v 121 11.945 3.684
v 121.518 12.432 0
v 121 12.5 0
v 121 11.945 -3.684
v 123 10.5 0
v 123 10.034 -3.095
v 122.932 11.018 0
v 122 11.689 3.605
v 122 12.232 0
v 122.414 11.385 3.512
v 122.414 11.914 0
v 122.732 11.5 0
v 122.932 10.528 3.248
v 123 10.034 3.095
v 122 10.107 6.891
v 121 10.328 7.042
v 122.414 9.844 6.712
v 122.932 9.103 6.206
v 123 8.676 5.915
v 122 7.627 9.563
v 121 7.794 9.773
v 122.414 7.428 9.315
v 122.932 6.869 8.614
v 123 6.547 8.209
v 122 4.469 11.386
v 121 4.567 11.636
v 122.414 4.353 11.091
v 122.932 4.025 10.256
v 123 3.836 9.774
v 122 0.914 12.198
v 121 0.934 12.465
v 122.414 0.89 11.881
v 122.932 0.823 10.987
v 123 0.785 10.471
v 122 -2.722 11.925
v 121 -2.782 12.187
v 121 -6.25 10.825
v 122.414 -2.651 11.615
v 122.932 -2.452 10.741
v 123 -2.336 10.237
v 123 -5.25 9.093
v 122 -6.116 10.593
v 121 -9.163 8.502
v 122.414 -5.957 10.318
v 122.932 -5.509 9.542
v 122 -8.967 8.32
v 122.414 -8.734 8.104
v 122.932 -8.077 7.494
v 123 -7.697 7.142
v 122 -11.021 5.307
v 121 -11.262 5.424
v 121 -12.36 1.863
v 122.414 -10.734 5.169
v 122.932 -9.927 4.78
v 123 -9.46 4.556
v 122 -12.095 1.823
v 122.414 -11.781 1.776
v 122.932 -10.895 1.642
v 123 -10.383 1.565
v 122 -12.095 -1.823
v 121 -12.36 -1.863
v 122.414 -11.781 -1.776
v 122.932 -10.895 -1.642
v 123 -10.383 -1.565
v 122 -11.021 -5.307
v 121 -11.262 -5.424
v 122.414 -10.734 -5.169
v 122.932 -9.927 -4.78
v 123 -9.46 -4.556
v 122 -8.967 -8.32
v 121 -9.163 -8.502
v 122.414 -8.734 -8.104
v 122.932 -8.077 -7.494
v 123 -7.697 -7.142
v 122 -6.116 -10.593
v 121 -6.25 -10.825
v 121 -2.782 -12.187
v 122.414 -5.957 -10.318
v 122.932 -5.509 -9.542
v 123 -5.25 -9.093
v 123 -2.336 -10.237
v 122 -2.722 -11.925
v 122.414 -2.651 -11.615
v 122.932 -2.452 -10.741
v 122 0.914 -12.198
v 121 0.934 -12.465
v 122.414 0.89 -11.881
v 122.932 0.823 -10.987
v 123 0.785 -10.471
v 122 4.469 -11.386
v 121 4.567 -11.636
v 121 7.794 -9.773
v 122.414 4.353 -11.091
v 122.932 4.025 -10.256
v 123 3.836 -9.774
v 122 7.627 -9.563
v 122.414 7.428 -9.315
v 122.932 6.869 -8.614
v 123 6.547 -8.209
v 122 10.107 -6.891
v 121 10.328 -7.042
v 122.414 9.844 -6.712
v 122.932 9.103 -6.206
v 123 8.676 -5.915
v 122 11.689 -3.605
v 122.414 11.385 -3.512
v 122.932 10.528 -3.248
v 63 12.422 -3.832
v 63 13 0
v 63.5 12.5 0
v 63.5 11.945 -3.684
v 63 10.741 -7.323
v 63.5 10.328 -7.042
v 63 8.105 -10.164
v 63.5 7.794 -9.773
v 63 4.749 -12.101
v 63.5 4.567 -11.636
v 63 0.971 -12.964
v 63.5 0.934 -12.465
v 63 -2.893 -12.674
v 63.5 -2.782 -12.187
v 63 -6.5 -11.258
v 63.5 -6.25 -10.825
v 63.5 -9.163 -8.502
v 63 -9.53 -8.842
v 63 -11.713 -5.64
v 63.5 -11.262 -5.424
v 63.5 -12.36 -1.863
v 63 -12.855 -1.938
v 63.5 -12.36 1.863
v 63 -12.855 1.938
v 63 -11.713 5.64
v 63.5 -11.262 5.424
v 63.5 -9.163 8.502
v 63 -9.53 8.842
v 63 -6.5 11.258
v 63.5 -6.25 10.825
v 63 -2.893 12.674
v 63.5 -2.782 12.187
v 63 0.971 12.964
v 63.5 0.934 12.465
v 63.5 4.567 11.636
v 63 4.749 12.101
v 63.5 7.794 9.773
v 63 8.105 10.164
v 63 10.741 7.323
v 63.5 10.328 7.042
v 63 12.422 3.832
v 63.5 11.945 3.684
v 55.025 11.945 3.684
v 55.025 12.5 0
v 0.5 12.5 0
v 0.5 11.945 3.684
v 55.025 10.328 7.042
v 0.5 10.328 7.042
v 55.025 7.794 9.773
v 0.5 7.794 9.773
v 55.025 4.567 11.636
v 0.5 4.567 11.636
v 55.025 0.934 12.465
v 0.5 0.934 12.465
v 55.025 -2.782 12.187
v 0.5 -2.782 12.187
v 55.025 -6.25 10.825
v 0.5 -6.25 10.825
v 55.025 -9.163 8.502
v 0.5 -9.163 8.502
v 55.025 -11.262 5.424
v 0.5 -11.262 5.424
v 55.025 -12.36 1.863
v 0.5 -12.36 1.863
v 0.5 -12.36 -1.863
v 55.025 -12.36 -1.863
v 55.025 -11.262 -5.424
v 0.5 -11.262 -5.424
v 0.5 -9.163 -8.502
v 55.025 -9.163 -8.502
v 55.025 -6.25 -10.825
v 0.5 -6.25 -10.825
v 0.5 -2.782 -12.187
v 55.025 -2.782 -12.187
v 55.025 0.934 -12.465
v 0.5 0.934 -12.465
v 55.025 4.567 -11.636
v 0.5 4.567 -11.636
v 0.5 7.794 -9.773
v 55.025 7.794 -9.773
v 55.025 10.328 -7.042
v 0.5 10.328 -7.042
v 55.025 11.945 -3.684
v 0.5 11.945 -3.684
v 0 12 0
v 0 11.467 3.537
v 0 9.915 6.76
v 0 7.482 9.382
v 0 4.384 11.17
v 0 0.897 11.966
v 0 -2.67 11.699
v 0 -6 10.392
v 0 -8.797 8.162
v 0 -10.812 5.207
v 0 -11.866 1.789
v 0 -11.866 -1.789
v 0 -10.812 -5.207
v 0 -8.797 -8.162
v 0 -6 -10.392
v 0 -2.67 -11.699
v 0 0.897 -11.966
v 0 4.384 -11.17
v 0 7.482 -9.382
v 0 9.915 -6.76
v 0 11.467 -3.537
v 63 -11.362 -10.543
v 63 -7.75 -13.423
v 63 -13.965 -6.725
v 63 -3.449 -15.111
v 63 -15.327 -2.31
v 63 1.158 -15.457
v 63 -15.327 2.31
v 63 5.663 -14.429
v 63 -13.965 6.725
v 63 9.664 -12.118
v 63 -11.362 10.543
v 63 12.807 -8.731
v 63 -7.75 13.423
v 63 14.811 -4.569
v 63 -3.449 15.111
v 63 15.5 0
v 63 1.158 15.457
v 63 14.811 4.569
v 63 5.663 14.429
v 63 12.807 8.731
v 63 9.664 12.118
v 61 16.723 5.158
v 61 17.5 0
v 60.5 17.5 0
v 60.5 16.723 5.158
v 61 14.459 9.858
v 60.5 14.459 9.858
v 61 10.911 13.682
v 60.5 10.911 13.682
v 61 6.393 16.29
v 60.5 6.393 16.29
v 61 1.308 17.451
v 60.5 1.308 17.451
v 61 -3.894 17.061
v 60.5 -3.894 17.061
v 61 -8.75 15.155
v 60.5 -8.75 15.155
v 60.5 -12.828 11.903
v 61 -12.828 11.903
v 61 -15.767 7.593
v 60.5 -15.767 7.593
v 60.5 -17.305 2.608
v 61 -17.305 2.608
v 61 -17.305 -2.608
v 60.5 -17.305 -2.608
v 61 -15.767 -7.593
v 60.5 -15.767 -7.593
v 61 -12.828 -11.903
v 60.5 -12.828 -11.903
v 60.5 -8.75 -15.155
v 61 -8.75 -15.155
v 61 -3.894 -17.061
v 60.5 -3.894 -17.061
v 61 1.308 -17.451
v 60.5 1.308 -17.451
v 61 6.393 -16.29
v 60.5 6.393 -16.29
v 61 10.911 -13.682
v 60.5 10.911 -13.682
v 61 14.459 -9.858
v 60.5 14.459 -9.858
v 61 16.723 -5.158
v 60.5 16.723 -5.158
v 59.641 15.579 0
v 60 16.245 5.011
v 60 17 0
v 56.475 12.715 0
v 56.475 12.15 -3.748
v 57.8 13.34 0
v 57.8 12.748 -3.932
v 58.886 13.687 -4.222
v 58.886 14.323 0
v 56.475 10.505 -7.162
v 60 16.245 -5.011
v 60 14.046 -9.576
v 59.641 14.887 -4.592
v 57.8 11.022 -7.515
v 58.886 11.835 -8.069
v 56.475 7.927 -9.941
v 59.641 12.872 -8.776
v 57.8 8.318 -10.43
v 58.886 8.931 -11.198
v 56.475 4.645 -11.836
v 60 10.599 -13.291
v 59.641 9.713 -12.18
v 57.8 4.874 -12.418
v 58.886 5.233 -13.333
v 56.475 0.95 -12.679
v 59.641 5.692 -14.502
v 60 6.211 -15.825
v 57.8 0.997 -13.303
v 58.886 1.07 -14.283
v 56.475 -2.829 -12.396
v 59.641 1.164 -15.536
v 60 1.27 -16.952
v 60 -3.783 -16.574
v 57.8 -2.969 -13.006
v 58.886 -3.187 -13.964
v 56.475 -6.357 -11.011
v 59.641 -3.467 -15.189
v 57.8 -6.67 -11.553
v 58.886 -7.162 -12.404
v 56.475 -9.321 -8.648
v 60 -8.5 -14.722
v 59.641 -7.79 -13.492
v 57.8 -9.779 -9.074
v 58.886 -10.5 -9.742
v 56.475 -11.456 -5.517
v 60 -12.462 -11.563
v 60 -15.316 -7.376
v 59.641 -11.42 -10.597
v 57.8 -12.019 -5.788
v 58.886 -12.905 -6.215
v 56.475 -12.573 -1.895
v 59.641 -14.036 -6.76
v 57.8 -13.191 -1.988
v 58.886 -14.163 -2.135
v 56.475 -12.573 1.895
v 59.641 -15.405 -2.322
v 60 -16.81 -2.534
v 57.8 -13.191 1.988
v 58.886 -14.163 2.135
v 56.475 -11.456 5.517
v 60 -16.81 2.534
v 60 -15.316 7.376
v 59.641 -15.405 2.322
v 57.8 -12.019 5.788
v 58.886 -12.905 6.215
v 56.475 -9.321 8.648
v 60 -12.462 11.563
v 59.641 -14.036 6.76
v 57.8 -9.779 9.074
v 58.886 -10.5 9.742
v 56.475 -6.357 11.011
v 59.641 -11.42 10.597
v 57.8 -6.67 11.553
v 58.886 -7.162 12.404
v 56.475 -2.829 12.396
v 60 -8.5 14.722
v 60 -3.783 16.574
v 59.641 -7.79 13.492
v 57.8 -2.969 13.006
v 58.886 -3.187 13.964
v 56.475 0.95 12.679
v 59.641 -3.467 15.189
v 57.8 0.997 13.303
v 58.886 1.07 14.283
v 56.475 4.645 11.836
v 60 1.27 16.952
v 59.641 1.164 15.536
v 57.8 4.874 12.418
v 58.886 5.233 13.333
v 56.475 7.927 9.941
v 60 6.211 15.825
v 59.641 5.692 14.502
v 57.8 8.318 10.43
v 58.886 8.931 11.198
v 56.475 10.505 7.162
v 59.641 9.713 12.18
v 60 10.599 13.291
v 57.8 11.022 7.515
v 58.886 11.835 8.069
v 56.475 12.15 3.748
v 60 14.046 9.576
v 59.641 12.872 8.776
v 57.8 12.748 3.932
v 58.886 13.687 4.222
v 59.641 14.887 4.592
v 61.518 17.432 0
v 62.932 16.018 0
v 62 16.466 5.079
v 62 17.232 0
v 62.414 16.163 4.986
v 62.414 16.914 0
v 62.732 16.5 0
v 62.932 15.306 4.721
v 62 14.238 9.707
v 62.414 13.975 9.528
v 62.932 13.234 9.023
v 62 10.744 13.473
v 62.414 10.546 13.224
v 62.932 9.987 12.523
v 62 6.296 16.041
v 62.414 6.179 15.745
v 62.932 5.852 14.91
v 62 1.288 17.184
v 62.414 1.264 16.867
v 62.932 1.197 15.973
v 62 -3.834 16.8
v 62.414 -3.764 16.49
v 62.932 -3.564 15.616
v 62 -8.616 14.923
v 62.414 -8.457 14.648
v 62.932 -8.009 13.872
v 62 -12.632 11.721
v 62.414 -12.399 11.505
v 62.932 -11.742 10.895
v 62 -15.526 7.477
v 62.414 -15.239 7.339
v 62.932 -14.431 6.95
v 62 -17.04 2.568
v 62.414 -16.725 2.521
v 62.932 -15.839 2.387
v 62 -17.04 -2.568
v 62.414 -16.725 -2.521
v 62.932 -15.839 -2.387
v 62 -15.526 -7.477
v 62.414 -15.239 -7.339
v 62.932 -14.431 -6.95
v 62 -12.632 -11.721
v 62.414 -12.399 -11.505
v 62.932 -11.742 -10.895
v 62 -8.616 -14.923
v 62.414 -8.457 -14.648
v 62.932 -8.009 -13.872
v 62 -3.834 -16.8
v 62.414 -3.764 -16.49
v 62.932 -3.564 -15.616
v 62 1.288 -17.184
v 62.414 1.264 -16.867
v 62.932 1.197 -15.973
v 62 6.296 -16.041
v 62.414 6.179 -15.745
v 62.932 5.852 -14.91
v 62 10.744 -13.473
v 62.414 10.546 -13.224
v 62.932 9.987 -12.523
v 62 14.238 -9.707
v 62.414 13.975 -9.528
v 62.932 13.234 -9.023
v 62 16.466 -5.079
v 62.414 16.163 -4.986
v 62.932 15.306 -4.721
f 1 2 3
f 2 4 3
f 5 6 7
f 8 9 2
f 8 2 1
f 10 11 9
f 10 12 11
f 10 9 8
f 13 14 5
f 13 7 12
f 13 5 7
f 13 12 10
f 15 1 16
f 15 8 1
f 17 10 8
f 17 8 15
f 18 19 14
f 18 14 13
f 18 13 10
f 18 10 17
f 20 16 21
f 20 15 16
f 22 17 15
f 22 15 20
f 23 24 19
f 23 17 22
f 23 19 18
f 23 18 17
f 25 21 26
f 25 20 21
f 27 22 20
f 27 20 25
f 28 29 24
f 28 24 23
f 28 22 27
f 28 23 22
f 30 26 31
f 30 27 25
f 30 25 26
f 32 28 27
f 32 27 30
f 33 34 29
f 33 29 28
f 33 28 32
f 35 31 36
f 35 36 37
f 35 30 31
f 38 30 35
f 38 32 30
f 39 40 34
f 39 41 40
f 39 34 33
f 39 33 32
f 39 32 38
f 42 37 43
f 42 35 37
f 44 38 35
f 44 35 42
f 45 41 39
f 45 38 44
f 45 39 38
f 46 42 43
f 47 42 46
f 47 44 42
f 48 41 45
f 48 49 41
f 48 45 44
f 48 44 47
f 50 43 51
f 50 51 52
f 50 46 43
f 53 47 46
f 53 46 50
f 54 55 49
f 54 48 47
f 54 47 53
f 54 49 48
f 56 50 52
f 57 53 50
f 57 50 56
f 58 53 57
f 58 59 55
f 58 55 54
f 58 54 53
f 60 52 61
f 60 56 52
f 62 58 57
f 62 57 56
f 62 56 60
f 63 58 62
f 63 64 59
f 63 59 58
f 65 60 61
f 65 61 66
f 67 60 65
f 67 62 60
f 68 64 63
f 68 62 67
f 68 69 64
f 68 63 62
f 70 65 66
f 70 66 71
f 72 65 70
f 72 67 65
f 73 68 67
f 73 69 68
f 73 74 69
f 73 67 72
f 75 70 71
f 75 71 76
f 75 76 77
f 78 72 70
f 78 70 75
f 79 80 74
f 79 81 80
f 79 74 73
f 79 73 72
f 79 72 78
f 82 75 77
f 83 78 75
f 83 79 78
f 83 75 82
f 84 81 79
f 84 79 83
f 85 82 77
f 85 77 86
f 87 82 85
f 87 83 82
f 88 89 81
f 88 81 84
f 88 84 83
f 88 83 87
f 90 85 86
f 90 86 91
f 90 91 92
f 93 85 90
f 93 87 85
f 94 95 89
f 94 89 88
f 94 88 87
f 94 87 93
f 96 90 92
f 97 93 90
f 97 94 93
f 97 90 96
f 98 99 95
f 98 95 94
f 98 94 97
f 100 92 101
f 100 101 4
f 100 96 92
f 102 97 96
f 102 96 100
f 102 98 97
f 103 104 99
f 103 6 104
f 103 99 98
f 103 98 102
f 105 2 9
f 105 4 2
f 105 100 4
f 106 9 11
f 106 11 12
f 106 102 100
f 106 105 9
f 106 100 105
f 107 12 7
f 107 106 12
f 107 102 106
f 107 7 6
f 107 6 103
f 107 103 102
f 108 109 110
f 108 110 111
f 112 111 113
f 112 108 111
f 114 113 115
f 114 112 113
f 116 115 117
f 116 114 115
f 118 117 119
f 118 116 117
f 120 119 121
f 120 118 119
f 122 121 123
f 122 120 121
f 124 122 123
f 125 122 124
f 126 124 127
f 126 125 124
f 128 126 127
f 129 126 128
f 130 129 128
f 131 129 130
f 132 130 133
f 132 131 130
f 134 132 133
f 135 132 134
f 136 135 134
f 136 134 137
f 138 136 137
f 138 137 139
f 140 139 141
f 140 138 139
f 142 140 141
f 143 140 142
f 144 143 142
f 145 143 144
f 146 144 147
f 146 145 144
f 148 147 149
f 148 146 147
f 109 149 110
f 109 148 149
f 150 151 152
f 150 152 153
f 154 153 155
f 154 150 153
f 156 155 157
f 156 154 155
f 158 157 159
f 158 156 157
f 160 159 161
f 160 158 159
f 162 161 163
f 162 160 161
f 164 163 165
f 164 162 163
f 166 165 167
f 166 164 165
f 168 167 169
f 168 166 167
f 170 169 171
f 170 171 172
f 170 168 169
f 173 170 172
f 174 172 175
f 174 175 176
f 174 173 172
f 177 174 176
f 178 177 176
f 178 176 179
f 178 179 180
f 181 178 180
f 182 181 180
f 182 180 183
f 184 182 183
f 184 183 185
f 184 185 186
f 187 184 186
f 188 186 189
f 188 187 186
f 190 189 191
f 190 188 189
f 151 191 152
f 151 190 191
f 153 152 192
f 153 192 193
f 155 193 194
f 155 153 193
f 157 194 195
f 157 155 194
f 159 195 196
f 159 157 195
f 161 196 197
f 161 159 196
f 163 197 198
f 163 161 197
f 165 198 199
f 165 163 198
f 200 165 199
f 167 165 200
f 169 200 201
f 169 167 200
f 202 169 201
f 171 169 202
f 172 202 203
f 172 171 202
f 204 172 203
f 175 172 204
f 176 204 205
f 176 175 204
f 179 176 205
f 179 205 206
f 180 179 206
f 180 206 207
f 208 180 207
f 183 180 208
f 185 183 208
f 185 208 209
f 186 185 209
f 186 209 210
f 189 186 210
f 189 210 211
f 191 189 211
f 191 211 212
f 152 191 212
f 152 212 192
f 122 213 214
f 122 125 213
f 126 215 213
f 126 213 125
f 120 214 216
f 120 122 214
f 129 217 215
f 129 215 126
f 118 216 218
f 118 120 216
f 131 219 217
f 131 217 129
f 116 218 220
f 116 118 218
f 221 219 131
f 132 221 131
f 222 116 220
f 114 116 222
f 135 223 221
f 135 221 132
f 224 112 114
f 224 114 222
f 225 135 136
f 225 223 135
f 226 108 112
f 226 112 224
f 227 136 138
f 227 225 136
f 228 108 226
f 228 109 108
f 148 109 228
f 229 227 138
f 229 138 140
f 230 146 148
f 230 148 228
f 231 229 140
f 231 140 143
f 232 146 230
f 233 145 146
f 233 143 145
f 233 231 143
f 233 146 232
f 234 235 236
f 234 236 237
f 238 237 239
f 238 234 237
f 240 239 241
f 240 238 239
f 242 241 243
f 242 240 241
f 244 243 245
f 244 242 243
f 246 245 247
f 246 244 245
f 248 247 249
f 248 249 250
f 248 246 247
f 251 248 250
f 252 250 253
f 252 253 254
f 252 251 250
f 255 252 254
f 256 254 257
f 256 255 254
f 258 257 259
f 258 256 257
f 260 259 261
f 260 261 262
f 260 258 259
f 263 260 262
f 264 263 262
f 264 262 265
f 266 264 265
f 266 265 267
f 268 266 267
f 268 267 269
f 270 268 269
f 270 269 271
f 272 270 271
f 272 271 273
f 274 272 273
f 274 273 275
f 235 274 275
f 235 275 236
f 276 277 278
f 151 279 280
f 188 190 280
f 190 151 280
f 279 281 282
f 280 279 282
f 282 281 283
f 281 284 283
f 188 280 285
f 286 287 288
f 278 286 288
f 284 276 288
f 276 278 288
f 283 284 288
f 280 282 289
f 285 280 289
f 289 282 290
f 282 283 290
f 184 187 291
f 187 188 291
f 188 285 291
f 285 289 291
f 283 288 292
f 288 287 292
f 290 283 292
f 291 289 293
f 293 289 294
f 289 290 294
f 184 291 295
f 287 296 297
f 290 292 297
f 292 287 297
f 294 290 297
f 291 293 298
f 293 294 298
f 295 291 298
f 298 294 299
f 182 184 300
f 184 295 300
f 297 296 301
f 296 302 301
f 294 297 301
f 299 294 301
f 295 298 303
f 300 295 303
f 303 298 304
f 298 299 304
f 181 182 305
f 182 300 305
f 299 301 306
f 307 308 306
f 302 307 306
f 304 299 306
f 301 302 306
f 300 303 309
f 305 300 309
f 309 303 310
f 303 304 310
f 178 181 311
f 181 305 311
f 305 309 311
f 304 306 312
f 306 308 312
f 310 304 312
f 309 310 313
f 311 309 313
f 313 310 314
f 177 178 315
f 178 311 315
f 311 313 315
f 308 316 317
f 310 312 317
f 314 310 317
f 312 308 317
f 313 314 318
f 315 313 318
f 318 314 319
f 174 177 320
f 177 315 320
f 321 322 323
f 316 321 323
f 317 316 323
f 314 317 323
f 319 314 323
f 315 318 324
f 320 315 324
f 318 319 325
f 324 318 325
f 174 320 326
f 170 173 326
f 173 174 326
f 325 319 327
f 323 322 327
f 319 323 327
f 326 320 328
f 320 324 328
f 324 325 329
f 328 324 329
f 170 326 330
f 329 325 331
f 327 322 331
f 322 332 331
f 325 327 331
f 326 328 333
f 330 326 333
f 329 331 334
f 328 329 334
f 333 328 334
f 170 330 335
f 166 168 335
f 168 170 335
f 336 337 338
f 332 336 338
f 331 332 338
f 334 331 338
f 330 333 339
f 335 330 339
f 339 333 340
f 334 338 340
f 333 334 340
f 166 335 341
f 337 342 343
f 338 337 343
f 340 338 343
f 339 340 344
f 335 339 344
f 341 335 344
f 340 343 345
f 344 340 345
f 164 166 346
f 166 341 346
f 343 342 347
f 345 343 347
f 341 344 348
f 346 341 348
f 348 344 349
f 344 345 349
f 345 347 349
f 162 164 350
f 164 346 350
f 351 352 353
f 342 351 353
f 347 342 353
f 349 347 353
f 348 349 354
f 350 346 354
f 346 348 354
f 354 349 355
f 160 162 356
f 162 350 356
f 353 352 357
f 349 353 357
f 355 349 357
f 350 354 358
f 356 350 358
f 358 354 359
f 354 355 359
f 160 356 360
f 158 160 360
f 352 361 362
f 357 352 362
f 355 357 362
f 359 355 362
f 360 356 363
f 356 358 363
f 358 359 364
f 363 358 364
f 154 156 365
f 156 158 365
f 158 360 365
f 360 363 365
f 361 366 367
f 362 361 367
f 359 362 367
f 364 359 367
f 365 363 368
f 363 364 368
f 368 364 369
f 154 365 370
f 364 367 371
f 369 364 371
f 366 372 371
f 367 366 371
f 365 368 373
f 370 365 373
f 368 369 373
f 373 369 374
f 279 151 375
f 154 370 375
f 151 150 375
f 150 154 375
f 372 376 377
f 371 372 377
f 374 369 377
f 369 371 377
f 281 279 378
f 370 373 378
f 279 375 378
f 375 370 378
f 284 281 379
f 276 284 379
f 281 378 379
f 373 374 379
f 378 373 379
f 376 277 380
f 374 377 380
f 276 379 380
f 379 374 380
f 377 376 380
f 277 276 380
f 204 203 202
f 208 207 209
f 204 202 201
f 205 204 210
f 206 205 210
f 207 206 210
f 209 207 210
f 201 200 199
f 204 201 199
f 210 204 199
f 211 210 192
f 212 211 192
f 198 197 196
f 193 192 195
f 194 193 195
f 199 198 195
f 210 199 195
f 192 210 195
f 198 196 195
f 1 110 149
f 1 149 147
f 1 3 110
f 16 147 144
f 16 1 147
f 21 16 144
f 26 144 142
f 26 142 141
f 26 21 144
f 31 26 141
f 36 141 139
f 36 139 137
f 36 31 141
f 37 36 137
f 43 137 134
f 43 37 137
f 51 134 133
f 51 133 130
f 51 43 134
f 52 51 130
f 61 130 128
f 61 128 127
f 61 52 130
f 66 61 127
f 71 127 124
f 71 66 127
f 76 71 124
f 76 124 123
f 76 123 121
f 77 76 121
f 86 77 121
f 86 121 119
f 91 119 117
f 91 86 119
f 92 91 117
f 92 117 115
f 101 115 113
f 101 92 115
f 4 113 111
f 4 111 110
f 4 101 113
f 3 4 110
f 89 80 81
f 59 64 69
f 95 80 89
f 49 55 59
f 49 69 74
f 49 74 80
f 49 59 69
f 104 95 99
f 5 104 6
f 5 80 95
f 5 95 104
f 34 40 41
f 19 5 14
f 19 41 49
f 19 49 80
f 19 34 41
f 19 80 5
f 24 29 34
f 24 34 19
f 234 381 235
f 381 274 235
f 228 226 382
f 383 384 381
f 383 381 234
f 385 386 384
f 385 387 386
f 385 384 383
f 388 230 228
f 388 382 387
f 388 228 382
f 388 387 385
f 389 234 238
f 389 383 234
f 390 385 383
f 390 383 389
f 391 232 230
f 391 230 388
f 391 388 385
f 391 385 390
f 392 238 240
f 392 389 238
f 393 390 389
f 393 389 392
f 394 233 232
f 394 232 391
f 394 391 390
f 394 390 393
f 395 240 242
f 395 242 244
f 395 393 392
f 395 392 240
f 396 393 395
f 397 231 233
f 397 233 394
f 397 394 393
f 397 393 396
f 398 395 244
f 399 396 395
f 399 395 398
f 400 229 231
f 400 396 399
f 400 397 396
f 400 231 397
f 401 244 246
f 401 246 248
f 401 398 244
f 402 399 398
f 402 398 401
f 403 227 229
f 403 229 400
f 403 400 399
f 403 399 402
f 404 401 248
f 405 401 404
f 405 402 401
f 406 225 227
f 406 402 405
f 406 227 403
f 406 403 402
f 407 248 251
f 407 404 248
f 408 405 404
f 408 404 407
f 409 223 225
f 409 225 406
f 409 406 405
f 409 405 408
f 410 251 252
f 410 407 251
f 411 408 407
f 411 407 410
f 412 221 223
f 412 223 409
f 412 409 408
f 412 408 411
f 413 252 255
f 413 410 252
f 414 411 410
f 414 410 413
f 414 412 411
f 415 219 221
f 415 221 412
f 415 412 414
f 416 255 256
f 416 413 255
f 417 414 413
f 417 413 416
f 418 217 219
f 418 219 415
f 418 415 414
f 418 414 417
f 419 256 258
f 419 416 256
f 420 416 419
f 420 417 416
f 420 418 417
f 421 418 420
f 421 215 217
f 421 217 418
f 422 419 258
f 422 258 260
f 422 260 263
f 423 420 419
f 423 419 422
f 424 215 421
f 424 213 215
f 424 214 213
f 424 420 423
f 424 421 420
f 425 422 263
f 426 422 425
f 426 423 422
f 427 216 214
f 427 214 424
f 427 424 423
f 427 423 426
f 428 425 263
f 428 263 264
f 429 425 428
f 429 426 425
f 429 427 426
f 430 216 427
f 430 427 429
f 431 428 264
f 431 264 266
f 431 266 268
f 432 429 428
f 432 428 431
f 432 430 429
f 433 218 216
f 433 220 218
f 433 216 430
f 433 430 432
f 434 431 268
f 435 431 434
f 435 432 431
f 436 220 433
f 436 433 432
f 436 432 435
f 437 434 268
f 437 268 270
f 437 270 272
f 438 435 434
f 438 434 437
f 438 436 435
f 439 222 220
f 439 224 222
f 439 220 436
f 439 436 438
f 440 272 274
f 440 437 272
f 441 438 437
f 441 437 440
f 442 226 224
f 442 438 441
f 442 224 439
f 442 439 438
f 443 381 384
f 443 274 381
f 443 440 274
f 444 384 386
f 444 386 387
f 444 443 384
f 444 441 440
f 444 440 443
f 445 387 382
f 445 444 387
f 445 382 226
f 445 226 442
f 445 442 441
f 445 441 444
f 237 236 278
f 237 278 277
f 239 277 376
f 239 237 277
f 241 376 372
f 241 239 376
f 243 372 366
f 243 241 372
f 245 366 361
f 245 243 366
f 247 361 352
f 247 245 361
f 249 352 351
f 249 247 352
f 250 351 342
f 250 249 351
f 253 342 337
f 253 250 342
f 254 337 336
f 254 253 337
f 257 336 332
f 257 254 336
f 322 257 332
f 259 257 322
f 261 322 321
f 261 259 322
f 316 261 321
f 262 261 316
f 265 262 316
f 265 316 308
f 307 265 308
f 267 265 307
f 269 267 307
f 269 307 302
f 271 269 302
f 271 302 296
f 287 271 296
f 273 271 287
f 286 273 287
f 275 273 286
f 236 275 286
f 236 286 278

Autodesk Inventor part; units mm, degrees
ref_plane "Start Plane" through (0, 0, 0) normal (1, 0, 0) x (0, 1, 0)
ref_plane "XZ Plane" through (0, 0, 0) normal (0, 1, 0) x (-1, 0, 0)
ref_plane "XY Plane" through (0, 0, 0) normal (0, 0, 1) x (1, 0, 0)
sketch "Main Sketch" plane through (0, 0, 0) normal (0, 0, 1) x (1, 0, 0)
  line L0 (0, 0) -> (123, 0)
  line L1 (0, 0) -> (0, 12.5)
  line L2 (0, 12.5) -> (60, 12.5)
  line L3 (60, 12.5) -> (60, 17.5)
  line L4 (63, 17.5) -> (63, 12.5)
  line L5 (60, 17.5) -> (63, 17.5)
  line L6 (123, 12.5) -> (123, 0)
  line L7 (63, 12.5) -> (123, 12.5)
  dimension "d3" = 25
  dimension "d4" = 35
  dimension "d5" = 25
revolve "Revolution1" add sketch "Main Sketch" angle 360 about axis through (0, 0, 0) along (1, 0, 0)
chamfer "Chamfer3" distance 0.5 angle 45 1 edges at (60, -17.5, 0) measured on face at (62, 17.4433, -1.4082)
fillet "Fillet2" radius 2 1 edges at (63, -17.5, 0)
chamfer "Chamfer4" distance 0.5 angle 45 1 edges at (63, -12.5, 0) measured on face at (103, 12.4595, -1.0058)
fillet "Fillet3" radius 2 1 edges at (123, -12.5, 0)
chamfer "Chamfer1" distance 0.5 angle 45 1 edges at (0, -12.5, 0) measured on face at (40, 12.4595, -1.0058)
fillet "Fillet1" radius 5 1 edges at (60, -12.5, 0)
equation "\"Length\" = 123"
properties part number "Shaft" material "Steel"
